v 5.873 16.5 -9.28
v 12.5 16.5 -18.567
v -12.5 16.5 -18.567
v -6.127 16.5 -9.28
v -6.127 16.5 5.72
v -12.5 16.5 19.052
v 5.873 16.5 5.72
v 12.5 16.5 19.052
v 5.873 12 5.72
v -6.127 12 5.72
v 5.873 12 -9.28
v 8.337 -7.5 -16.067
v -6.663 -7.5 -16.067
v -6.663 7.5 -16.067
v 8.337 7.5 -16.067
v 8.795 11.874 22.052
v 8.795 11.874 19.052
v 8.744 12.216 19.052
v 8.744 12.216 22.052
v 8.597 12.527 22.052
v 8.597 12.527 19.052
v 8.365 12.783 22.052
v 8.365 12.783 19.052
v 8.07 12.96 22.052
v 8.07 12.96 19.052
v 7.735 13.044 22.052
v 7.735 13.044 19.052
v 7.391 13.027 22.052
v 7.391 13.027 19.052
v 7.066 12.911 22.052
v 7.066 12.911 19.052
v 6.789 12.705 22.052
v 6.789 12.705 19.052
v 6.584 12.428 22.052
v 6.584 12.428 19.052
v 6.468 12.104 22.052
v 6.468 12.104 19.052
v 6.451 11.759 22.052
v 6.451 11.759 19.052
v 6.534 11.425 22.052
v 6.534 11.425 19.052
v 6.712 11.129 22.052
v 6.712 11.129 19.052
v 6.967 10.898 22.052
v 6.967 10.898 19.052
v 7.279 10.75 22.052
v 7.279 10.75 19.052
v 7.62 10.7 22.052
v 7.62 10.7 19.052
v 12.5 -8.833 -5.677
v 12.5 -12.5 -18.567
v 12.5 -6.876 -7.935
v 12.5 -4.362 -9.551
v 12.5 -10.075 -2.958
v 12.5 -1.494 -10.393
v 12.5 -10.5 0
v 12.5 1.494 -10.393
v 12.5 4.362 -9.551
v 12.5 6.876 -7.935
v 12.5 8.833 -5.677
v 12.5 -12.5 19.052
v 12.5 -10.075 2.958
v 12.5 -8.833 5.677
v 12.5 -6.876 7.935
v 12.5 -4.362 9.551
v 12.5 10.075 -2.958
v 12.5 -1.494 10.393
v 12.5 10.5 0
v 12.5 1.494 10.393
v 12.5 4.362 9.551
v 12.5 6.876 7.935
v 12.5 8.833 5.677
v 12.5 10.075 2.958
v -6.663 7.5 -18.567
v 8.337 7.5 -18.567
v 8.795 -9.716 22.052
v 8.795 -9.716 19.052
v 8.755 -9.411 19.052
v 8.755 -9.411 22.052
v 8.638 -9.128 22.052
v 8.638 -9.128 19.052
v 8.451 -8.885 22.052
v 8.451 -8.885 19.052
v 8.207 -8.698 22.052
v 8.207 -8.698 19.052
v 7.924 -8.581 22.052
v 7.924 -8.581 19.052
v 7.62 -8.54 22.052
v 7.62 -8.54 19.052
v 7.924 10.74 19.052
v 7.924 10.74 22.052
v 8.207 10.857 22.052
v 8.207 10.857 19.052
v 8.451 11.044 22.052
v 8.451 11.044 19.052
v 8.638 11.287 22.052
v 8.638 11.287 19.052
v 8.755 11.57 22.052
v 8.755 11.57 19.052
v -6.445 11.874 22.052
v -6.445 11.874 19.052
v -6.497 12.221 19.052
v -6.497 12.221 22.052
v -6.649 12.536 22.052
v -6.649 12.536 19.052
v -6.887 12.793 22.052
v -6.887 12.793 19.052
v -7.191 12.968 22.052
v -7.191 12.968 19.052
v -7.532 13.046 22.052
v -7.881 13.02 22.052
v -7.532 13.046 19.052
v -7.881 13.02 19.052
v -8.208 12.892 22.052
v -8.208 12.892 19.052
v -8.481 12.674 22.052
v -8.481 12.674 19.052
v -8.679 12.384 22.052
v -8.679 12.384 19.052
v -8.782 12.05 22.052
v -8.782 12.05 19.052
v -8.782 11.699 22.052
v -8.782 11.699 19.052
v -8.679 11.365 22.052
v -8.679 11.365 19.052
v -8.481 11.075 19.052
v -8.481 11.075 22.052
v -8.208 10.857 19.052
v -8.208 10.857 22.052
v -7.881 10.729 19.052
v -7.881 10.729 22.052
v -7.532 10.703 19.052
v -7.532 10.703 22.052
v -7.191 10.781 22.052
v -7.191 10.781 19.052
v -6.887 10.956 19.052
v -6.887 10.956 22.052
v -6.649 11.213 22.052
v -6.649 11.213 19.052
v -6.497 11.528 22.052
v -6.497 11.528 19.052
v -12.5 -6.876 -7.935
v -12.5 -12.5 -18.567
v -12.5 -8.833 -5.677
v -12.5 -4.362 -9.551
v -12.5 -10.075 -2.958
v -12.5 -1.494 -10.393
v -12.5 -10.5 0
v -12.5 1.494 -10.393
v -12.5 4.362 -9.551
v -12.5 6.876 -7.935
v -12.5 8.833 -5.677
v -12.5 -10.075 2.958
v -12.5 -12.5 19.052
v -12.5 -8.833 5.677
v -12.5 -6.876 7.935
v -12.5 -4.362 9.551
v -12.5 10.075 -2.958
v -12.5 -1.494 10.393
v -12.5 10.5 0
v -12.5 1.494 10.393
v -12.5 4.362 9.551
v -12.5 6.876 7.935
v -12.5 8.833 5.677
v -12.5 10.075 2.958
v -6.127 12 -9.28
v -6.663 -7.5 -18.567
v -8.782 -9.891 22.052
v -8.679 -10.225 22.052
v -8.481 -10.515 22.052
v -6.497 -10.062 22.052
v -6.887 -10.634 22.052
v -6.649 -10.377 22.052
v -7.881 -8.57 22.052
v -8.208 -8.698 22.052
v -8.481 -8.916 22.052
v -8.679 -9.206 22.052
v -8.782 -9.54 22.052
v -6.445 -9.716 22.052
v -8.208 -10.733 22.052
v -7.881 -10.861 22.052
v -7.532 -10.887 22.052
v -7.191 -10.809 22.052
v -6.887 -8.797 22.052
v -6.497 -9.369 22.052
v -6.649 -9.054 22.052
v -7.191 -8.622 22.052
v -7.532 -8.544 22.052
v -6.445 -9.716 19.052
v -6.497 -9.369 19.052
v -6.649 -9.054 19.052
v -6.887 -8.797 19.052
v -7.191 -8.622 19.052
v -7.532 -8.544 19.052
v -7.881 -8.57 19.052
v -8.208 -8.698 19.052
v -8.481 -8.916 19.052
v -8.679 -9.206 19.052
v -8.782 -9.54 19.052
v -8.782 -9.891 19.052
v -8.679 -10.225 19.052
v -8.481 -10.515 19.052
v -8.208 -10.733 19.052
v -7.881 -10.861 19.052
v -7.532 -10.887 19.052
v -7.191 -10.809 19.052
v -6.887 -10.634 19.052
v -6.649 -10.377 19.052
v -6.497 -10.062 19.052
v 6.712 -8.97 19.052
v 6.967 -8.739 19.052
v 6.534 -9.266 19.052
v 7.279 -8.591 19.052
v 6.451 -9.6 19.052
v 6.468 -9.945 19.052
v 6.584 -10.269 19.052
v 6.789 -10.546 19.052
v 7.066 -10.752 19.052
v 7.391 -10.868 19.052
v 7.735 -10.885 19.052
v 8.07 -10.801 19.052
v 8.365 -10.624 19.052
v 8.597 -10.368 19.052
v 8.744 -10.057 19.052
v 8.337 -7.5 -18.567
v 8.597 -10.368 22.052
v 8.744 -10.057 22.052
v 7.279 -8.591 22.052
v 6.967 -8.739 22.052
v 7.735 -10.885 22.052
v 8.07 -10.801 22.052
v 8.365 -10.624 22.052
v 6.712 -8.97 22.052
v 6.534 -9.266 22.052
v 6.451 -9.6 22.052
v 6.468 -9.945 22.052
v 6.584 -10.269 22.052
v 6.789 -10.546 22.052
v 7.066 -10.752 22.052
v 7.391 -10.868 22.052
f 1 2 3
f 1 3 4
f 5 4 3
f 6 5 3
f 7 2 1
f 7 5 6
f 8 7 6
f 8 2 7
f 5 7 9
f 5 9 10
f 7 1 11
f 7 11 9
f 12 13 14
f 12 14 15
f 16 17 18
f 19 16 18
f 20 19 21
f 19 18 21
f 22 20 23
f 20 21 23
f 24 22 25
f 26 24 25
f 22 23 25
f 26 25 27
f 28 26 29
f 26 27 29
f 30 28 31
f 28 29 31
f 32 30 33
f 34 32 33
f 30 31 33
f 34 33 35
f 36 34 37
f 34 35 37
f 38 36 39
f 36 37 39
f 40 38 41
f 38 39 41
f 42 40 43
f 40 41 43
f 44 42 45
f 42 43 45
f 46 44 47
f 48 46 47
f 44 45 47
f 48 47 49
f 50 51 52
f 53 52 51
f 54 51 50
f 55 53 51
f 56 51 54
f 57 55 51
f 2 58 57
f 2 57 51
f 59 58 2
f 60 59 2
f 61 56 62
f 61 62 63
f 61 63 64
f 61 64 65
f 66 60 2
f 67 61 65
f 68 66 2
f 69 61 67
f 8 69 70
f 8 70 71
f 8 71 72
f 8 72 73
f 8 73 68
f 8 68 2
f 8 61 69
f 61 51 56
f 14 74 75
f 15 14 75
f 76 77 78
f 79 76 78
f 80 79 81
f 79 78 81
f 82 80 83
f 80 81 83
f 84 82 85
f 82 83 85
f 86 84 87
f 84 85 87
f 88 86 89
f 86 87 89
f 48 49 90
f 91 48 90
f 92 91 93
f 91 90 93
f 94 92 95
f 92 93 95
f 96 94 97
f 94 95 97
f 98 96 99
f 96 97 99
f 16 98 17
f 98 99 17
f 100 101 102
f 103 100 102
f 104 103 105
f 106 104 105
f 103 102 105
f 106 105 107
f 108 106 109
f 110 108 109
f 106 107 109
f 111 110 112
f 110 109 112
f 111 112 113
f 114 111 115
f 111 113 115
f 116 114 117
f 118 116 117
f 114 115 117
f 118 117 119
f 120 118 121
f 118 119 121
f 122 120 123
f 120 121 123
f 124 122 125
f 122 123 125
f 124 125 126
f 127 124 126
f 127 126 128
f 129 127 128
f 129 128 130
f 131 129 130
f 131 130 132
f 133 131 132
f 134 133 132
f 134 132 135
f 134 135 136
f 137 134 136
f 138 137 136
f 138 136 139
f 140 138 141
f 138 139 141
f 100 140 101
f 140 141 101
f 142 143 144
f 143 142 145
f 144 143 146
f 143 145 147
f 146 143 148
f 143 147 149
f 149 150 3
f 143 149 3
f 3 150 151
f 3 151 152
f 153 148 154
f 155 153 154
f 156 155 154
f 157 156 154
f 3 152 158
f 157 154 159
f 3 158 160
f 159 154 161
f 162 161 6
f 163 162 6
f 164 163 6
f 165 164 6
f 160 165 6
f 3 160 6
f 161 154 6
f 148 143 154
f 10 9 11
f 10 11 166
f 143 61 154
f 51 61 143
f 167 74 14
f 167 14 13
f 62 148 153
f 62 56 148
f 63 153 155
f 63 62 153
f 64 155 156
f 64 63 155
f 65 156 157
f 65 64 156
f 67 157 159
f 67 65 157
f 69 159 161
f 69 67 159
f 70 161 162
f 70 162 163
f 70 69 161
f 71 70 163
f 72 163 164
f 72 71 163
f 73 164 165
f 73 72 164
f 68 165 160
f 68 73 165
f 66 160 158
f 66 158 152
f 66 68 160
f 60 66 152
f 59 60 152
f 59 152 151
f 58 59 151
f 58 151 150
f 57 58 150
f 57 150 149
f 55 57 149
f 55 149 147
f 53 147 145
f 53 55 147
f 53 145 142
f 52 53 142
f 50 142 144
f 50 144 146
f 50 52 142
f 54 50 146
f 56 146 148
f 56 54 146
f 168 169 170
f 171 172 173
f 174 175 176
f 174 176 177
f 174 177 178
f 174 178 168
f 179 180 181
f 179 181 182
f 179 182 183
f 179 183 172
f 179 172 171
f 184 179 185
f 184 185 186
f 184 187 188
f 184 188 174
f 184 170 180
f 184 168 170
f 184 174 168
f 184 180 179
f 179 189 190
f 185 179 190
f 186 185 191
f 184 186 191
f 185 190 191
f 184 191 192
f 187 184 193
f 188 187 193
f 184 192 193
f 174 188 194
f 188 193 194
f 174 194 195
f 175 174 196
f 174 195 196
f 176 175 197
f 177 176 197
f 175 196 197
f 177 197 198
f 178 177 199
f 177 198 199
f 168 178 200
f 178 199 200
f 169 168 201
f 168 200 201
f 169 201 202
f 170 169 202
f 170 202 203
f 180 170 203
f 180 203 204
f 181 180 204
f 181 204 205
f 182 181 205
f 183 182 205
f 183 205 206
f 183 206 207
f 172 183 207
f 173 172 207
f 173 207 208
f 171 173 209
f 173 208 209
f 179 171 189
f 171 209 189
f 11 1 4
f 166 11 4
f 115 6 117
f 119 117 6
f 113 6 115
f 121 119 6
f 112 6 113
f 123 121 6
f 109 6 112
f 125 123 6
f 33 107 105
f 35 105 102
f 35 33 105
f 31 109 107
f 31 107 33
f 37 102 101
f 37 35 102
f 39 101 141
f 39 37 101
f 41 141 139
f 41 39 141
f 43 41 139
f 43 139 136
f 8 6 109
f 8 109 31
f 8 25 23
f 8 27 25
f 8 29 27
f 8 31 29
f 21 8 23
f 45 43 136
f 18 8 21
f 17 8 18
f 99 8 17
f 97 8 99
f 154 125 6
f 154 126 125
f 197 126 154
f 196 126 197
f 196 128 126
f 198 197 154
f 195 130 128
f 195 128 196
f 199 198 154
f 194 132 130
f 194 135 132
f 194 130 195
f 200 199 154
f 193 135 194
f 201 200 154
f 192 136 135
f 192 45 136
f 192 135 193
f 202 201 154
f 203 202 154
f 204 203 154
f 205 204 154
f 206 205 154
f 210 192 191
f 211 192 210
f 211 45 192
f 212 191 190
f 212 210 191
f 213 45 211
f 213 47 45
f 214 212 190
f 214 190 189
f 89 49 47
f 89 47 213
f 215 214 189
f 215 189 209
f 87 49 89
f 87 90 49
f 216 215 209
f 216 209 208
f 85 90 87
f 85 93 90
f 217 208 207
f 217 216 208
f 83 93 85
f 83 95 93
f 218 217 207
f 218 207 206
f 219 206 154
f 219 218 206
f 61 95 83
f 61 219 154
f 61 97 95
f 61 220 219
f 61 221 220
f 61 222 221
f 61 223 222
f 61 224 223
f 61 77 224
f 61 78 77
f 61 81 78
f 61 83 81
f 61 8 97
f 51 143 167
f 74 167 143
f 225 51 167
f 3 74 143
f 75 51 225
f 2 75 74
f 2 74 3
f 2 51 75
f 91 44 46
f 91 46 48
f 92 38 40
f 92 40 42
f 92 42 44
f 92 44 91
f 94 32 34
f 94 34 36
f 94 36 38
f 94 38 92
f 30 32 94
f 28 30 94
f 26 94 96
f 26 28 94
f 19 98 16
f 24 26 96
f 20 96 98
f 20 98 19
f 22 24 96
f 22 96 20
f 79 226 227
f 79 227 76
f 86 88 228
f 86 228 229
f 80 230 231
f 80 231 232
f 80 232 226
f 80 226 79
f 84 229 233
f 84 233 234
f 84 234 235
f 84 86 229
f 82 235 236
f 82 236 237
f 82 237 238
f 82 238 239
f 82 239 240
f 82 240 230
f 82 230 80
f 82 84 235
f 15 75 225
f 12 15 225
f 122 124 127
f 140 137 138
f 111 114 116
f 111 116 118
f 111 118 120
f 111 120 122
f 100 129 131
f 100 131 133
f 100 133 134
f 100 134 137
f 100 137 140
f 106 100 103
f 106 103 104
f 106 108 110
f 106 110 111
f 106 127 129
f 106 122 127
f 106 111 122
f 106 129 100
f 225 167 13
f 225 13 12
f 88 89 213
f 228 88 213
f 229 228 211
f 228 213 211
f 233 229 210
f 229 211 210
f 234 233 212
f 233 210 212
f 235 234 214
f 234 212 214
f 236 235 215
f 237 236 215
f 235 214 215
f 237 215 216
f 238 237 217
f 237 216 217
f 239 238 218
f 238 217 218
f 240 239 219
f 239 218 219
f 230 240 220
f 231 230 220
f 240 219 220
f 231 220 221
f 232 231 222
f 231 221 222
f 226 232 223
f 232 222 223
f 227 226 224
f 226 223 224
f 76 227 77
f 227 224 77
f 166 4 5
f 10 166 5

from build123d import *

# Parameters (mm, degrees)
F1_DEPTH = 12.5
F2_R     = 1.175
F3_DEPTH = 3
F4_W     = 15
F4_H     = 15
F5_DEPTH = 2.5
F6_W     = 12
F6_H     = 15
F7_DEPTH = 4.5


with BuildPart() as f1:
    # F0 (on Right) → F1 (new body, symmetric)
    with BuildSketch(Plane.YZ):
        with BuildLine():
            Line((16.5, 0), (10.5, 0))
            ThreePointArc((10.5, 0), (0, -10.5), (-10.5, 0))
            Line((-10.5, 0), (-12.5, 0))
            Line((-12.5, 0), (-12.5, -18.566574))
            Line((-12.5, -18.566574), (-1.889947, -18.566574))
            Line((-1.889947, -18.566574), (16.5, -18.566574))
            Line((16.5, -18.566574), (16.5, 0))
        make_face()
        with BuildLine():
            ThreePointArc((-10.5, 0), (0, 10.5), (10.5, 0))
            Line((10.5, 0), (16.5, 0))
            Line((16.5, 0), (16.5, 19.05242))
            Line((16.5, 19.05242), (-12.5, 19.05242))
            Line((-12.5, 19.05242), (-12.5, 0))
            Line((-12.5, 0), (-10.5, 0))
        make_face()
    extrude(amount=F1_DEPTH, both=True)

    # F2 (on face) → F3 (join)
    with BuildSketch(Plane.XY.offset(19.05242)):
        with Locations((-7.62, -9.7155)):
            Circle(F2_R)
        with BuildLine():
            ThreePointArc((7.62, -8.5405), (6.78915, -10.54635), (8.795, -9.7155))
            ThreePointArc((8.795, -9.7155), (8.45085, -8.88465), (7.62, -8.5405))
        make_face()
        with BuildLine():
            ThreePointArc((8.795, 11.8745), (6.78915, 12.70535), (7.62, 10.6995))
            ThreePointArc((7.62, 10.6995), (8.45085, 11.04365), (8.795, 11.8745))
        make_face()
        with Locations((-7.62, 11.8745)):
            Circle(F2_R)
    extrude(amount=F3_DEPTH)

    # F4 (on face) → F5 (cut)
    with BuildSketch(Plane(origin=(0, 0, -18.566574), x_dir=(1, 0, 0), z_dir=(0, 0, -1))):
        with Locations((0.837269, 0)):
            Rectangle(F4_W, F4_H)
    extrude(amount=-F5_DEPTH, mode=Mode.SUBTRACT)

    # F6 (on face) → F7 (cut)
    with BuildSketch(Plane(origin=(0, 16.5, 0), x_dir=(-1, 0, 0), z_dir=(0, 1, 0))):
        with Locations((0.127016, -1.779968)):
            Rectangle(F6_W, F6_H)
    extrude(amount=-F7_DEPTH, mode=Mode.SUBTRACT)


solid = f1.part
